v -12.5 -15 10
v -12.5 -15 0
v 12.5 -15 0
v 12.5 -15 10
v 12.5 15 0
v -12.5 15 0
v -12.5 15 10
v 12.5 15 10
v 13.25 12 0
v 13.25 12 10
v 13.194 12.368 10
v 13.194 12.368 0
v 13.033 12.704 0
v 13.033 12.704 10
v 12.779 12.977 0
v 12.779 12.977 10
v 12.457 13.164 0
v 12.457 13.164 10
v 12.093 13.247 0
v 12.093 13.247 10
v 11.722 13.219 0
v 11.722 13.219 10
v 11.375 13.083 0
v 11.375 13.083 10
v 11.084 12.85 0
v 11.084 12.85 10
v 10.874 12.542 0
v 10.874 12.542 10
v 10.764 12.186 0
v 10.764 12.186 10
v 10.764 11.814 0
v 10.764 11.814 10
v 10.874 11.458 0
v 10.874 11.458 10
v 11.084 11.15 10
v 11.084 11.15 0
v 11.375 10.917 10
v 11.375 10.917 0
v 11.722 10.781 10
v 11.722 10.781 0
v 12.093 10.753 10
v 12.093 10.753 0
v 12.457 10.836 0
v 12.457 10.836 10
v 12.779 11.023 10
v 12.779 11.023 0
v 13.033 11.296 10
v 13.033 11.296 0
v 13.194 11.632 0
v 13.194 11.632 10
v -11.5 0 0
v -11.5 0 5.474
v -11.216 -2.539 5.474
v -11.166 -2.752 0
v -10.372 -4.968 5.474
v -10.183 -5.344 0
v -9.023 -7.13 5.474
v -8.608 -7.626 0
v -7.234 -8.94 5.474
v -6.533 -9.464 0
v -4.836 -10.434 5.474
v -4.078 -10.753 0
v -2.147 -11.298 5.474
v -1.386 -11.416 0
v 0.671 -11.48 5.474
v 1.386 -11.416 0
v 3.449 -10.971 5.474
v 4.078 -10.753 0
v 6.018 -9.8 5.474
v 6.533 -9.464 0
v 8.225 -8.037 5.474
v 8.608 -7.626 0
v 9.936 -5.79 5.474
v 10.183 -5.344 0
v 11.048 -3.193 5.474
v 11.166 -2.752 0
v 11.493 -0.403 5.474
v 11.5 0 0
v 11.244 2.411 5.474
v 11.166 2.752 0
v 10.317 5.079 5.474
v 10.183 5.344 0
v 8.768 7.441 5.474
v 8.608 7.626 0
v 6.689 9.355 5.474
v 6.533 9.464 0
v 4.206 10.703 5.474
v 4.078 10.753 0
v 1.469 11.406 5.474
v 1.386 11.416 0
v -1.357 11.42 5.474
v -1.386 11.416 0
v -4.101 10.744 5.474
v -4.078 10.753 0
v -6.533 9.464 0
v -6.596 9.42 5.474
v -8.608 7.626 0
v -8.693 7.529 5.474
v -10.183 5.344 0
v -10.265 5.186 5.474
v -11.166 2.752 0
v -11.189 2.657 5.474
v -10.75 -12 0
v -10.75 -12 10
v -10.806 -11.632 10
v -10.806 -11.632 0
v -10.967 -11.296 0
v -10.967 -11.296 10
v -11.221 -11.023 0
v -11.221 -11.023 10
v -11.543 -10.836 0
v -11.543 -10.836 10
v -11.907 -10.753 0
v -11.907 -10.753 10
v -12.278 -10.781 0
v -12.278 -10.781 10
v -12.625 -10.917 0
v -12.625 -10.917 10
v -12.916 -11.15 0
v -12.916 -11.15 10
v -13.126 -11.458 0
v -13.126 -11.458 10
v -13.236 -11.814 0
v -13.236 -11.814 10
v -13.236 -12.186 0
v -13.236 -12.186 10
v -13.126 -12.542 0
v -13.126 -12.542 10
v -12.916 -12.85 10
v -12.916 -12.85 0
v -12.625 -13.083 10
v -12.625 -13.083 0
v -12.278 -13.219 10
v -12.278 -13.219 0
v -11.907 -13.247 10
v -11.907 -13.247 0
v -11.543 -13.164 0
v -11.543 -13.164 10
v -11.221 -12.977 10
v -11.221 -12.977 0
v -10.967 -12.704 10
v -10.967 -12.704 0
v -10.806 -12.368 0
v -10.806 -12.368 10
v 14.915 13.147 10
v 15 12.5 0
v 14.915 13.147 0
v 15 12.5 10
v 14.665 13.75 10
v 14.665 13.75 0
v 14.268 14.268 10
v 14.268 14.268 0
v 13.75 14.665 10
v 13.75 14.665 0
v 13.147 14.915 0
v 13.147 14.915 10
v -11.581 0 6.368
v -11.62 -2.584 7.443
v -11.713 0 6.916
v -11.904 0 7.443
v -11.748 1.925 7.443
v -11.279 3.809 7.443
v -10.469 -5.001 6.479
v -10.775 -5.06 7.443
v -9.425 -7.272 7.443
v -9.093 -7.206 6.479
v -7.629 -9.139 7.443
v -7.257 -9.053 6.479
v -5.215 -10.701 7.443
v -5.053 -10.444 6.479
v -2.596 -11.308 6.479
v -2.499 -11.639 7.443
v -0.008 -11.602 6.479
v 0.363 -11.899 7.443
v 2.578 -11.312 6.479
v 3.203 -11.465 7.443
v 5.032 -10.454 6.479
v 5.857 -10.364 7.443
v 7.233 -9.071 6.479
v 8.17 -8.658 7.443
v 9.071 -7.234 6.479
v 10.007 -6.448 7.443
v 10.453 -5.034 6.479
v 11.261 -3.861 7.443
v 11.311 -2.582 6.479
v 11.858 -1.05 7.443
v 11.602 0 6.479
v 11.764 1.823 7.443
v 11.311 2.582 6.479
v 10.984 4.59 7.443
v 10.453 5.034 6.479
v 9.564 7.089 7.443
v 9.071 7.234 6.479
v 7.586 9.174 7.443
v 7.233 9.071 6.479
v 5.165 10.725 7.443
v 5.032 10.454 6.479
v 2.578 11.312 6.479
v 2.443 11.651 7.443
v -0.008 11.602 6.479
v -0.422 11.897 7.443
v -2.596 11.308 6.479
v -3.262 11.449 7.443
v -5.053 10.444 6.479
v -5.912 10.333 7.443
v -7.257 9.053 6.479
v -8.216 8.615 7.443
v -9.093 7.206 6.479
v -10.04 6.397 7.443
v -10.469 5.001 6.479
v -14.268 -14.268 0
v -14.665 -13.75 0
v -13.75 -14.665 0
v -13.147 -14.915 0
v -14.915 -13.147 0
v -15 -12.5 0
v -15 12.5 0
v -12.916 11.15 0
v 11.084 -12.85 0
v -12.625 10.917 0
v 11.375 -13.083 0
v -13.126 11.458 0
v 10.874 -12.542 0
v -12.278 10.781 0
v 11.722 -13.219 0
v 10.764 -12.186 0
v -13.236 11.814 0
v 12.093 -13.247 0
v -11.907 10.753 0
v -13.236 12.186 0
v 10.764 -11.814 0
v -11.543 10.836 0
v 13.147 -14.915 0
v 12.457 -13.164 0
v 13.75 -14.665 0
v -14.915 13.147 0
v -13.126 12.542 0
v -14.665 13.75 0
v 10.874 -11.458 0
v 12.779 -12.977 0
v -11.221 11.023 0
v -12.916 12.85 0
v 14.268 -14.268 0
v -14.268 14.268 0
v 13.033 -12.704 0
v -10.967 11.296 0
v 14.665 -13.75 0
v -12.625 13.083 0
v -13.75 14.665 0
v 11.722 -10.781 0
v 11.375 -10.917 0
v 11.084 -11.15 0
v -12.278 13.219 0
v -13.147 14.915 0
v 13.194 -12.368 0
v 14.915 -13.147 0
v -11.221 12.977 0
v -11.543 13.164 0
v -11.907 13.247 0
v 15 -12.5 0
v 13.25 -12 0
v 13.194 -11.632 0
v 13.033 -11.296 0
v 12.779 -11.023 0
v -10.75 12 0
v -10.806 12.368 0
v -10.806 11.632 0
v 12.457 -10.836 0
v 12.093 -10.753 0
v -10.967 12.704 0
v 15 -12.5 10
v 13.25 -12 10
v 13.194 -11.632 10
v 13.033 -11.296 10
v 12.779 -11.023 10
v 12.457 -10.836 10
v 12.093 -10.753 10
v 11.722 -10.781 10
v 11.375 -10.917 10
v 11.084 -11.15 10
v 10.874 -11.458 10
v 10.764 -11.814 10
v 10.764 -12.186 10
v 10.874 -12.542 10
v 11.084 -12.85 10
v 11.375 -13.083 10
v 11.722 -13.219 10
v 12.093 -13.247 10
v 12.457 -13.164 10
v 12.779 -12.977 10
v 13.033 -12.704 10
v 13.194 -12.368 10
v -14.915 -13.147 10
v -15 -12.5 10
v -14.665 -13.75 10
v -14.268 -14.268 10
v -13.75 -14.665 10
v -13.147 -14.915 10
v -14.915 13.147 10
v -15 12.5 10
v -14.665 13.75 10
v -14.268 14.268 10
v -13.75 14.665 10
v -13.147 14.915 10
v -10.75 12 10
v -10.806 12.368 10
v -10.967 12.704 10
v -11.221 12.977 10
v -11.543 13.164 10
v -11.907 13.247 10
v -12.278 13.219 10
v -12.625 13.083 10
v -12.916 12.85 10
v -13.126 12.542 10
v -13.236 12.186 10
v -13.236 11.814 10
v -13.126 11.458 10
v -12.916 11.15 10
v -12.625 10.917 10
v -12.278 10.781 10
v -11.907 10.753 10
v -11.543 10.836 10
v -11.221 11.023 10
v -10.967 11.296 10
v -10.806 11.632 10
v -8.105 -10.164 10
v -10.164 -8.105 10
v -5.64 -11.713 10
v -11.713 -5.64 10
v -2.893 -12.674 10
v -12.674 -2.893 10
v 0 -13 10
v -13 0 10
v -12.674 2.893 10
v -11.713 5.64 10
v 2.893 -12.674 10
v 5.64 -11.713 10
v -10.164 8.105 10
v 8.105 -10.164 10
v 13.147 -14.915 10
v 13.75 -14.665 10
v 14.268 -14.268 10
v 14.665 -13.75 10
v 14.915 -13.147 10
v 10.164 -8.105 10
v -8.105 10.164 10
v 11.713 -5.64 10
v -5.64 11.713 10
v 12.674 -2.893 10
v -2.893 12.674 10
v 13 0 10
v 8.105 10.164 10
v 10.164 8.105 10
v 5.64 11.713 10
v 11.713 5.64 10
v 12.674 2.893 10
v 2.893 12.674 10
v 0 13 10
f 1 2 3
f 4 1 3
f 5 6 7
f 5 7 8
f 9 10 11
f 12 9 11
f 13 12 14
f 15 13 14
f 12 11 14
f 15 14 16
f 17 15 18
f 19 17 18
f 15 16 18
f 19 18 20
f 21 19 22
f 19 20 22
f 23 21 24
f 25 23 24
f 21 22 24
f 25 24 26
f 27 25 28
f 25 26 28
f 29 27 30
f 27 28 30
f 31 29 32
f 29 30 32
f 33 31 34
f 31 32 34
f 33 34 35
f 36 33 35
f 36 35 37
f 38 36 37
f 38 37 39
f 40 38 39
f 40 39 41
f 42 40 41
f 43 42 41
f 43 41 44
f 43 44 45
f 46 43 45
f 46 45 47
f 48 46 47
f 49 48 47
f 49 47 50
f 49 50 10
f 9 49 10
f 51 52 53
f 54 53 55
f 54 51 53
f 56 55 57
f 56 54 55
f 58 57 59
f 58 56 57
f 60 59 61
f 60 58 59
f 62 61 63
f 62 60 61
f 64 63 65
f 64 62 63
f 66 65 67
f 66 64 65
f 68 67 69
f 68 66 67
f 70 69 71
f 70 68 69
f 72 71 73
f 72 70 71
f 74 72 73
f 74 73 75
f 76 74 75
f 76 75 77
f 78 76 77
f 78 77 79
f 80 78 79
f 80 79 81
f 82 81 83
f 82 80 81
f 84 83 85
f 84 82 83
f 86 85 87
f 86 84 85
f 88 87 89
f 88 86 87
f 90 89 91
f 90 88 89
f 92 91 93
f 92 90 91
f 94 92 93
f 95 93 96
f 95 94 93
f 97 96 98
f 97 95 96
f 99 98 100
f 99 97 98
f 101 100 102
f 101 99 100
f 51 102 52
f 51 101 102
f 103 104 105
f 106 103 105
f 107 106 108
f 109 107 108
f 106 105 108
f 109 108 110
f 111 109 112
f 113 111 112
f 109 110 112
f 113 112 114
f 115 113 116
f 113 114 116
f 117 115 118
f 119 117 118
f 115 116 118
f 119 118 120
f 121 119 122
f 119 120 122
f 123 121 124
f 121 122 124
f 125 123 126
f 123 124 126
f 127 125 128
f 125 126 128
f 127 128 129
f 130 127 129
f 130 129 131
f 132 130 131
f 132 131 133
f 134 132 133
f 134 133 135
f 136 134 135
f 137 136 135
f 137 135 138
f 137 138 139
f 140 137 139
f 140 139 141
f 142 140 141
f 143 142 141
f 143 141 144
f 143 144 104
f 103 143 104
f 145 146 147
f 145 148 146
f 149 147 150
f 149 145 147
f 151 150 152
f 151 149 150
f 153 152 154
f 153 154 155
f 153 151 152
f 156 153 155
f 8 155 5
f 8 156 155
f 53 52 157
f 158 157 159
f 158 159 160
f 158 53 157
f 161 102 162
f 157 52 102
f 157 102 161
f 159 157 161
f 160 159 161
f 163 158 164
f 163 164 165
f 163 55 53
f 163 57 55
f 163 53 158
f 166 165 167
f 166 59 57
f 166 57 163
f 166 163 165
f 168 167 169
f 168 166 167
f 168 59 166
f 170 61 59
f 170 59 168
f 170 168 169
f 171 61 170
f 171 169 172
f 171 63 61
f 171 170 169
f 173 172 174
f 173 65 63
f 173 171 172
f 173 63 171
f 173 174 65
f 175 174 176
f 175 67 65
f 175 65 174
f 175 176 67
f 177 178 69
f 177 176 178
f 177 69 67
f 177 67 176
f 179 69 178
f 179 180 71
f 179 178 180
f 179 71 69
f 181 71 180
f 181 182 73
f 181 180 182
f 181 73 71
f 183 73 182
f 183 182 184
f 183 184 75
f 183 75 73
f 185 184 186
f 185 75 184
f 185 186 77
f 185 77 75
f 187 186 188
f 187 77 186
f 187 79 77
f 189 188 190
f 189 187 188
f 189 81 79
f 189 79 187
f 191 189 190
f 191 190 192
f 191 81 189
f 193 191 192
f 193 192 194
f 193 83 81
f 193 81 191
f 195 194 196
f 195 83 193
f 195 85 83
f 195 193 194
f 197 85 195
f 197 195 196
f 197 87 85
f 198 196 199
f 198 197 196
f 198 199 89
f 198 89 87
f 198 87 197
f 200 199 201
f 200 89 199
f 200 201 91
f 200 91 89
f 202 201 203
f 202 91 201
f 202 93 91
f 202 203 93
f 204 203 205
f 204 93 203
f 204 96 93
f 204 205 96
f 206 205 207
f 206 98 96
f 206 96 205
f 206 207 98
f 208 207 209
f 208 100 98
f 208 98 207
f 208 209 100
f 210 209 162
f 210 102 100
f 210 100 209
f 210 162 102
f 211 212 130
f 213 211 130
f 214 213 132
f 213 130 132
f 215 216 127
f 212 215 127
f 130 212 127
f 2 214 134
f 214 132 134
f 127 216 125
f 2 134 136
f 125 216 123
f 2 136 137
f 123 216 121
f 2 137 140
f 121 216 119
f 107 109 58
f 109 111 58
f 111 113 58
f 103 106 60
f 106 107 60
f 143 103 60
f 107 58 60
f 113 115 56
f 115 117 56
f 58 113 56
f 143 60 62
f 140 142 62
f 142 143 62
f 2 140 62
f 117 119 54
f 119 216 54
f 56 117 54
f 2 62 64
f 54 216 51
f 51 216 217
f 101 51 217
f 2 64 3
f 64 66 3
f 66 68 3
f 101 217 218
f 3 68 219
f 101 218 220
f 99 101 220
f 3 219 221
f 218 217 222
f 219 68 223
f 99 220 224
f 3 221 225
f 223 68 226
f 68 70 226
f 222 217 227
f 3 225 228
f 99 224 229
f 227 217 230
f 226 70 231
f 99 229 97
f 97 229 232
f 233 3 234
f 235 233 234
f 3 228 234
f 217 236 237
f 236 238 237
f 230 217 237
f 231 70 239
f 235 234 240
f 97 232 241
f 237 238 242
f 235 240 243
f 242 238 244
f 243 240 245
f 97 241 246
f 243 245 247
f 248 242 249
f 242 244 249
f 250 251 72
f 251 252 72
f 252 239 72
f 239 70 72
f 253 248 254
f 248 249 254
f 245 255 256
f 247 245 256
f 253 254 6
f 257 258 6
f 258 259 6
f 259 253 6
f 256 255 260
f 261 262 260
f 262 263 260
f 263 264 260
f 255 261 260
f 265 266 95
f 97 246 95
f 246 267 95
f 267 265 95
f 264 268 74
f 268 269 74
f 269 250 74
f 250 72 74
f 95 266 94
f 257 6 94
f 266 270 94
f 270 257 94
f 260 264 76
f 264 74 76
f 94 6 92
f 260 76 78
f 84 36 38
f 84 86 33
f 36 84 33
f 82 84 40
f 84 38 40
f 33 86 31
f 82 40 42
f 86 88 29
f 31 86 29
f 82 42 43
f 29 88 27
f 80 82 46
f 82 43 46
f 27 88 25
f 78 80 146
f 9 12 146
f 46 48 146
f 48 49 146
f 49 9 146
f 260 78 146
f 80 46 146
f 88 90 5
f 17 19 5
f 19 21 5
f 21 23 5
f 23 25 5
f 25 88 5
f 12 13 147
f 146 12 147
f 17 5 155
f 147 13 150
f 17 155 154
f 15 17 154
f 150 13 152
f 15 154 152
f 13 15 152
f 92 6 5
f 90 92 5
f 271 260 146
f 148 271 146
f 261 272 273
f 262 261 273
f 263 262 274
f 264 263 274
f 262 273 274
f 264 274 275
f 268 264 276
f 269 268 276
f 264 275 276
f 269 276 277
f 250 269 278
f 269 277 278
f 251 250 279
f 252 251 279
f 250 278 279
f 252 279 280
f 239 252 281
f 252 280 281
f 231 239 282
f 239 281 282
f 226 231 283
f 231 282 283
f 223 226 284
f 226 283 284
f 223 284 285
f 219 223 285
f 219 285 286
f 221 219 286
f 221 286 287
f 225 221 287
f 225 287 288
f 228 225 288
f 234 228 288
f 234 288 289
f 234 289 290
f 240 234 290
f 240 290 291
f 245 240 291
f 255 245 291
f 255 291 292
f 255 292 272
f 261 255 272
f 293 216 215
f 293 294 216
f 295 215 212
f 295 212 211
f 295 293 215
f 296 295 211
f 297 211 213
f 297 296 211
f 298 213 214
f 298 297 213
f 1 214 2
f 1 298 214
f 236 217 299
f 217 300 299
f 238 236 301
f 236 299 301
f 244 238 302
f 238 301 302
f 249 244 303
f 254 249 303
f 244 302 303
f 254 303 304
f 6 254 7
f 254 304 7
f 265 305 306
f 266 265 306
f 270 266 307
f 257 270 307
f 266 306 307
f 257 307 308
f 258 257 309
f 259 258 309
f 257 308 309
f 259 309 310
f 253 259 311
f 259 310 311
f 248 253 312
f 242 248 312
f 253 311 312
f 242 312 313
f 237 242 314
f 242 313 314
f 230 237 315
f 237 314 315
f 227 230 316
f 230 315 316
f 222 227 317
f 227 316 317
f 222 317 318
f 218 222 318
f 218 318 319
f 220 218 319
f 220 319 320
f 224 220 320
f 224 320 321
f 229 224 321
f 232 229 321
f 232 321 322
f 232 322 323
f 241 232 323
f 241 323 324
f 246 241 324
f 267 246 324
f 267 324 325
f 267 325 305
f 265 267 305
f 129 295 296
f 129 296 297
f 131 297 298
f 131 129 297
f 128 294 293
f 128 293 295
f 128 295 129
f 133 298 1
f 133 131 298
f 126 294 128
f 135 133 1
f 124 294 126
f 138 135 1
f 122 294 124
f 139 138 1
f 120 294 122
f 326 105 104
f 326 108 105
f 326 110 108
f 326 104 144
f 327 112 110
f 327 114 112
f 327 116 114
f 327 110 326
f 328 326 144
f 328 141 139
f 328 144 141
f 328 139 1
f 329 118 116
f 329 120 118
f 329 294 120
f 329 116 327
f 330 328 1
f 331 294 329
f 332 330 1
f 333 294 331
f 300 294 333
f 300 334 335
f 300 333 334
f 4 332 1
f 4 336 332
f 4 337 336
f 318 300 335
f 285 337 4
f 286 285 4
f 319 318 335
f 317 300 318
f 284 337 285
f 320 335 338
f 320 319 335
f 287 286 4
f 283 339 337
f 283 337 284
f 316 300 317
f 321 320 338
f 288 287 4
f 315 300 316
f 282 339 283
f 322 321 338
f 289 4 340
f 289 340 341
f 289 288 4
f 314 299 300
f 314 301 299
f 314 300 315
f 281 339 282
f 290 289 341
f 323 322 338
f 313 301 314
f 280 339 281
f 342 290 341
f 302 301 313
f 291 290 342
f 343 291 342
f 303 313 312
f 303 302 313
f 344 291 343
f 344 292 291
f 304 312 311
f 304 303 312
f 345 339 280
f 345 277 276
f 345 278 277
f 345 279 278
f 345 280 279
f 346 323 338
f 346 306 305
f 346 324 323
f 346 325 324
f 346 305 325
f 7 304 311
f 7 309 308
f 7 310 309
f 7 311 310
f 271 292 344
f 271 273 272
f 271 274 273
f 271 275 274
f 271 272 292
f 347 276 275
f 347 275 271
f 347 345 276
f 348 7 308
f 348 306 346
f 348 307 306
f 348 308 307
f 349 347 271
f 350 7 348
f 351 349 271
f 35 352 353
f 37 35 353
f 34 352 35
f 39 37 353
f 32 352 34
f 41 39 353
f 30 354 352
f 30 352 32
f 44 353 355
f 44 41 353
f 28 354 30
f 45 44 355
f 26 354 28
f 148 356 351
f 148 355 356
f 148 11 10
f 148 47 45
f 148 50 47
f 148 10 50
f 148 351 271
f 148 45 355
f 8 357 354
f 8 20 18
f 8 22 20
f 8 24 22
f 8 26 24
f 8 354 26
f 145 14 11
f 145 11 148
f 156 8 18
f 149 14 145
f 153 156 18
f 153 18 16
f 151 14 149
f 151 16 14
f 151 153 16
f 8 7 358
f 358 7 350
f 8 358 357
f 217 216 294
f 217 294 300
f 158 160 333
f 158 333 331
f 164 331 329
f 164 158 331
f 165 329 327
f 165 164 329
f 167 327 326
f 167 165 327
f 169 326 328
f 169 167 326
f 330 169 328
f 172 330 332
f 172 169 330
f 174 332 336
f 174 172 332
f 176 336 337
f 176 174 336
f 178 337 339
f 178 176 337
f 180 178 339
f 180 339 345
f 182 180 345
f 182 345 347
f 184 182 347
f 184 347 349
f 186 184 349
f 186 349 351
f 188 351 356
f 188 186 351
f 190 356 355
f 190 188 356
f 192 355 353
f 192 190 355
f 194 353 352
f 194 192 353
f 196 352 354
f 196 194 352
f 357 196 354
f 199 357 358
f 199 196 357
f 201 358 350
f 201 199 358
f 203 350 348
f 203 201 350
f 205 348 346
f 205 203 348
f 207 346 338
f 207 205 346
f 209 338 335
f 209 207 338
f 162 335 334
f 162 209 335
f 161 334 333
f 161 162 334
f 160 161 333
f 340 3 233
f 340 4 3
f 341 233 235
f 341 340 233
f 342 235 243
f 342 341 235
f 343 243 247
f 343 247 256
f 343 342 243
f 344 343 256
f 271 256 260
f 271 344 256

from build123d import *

# Parameters (mm, degrees)
SKETCH1_W           = 30
SKETCH1_H           = 30
BOSS_EXTRUDE1_DEPTH = 10
FILLET1_R           = 2.5
SKETCH2_R           = 1.25
CUT_EXTRUDE1_DEPTH  = 24.452078799
FILLET2_R           = 5


with BuildPart() as part:
    # Sketch1 → Boss-Extrude1 (new body)
    with BuildSketch(Plane.XY):
        Rectangle(SKETCH1_W, SKETCH1_H)
    extrude(amount=BOSS_EXTRUDE1_DEPTH)

    # Fillet1
    fillet1_edges = [part.edges().sort_by_distance(p)[0] for p in [
        (15, -15, 5),
        (-15, -15, 5),
        (-15, 15, 5),
        (15, 15, 5),
    ]]
    fillet(fillet1_edges, radius=FILLET1_R)

    # Sketch2 → Cut-Extrude1 (cut, through all)
    with BuildSketch(Plane.XY.offset(10)):
        with Locations((-12, 12)):
            Circle(SKETCH2_R)
        with Locations((12, 12)):
            Circle(SKETCH2_R)
        with Locations((12, -12)):
            Circle(SKETCH2_R)
        with Locations((-12, -12)):
            Circle(SKETCH2_R)
    extrude(amount=-CUT_EXTRUDE1_DEPTH, mode=Mode.SUBTRACT)

    # Sketch4 → Cut-Revolve1 (revolve, cut)
    with BuildSketch(Plane(origin=(0, 0, 0), x_dir=(0, 0, -1), z_dir=(1, 0, 0)), mode=Mode.PRIVATE) as cut_revolve1_sk:
        Polygon((0, 0), (-10, 0), (-10, 13), (-6.5, 11.5), (0, 11.5), align=None)
    revolve(cut_revolve1_sk.sketch.rotate(Axis((0, 0, 0), (0, 0, 1)), 90), axis=Axis((0, 0, 0), (0, 0, 1)), mode=Mode.SUBTRACT)

    # Fillet2
    fillet2_edges = [part.edges().sort_by_distance(p)[0] for p in [
        (11.5, 0, 6.5),
    ]]
    fillet(fillet2_edges, radius=FILLET2_R)


solid = part.part
